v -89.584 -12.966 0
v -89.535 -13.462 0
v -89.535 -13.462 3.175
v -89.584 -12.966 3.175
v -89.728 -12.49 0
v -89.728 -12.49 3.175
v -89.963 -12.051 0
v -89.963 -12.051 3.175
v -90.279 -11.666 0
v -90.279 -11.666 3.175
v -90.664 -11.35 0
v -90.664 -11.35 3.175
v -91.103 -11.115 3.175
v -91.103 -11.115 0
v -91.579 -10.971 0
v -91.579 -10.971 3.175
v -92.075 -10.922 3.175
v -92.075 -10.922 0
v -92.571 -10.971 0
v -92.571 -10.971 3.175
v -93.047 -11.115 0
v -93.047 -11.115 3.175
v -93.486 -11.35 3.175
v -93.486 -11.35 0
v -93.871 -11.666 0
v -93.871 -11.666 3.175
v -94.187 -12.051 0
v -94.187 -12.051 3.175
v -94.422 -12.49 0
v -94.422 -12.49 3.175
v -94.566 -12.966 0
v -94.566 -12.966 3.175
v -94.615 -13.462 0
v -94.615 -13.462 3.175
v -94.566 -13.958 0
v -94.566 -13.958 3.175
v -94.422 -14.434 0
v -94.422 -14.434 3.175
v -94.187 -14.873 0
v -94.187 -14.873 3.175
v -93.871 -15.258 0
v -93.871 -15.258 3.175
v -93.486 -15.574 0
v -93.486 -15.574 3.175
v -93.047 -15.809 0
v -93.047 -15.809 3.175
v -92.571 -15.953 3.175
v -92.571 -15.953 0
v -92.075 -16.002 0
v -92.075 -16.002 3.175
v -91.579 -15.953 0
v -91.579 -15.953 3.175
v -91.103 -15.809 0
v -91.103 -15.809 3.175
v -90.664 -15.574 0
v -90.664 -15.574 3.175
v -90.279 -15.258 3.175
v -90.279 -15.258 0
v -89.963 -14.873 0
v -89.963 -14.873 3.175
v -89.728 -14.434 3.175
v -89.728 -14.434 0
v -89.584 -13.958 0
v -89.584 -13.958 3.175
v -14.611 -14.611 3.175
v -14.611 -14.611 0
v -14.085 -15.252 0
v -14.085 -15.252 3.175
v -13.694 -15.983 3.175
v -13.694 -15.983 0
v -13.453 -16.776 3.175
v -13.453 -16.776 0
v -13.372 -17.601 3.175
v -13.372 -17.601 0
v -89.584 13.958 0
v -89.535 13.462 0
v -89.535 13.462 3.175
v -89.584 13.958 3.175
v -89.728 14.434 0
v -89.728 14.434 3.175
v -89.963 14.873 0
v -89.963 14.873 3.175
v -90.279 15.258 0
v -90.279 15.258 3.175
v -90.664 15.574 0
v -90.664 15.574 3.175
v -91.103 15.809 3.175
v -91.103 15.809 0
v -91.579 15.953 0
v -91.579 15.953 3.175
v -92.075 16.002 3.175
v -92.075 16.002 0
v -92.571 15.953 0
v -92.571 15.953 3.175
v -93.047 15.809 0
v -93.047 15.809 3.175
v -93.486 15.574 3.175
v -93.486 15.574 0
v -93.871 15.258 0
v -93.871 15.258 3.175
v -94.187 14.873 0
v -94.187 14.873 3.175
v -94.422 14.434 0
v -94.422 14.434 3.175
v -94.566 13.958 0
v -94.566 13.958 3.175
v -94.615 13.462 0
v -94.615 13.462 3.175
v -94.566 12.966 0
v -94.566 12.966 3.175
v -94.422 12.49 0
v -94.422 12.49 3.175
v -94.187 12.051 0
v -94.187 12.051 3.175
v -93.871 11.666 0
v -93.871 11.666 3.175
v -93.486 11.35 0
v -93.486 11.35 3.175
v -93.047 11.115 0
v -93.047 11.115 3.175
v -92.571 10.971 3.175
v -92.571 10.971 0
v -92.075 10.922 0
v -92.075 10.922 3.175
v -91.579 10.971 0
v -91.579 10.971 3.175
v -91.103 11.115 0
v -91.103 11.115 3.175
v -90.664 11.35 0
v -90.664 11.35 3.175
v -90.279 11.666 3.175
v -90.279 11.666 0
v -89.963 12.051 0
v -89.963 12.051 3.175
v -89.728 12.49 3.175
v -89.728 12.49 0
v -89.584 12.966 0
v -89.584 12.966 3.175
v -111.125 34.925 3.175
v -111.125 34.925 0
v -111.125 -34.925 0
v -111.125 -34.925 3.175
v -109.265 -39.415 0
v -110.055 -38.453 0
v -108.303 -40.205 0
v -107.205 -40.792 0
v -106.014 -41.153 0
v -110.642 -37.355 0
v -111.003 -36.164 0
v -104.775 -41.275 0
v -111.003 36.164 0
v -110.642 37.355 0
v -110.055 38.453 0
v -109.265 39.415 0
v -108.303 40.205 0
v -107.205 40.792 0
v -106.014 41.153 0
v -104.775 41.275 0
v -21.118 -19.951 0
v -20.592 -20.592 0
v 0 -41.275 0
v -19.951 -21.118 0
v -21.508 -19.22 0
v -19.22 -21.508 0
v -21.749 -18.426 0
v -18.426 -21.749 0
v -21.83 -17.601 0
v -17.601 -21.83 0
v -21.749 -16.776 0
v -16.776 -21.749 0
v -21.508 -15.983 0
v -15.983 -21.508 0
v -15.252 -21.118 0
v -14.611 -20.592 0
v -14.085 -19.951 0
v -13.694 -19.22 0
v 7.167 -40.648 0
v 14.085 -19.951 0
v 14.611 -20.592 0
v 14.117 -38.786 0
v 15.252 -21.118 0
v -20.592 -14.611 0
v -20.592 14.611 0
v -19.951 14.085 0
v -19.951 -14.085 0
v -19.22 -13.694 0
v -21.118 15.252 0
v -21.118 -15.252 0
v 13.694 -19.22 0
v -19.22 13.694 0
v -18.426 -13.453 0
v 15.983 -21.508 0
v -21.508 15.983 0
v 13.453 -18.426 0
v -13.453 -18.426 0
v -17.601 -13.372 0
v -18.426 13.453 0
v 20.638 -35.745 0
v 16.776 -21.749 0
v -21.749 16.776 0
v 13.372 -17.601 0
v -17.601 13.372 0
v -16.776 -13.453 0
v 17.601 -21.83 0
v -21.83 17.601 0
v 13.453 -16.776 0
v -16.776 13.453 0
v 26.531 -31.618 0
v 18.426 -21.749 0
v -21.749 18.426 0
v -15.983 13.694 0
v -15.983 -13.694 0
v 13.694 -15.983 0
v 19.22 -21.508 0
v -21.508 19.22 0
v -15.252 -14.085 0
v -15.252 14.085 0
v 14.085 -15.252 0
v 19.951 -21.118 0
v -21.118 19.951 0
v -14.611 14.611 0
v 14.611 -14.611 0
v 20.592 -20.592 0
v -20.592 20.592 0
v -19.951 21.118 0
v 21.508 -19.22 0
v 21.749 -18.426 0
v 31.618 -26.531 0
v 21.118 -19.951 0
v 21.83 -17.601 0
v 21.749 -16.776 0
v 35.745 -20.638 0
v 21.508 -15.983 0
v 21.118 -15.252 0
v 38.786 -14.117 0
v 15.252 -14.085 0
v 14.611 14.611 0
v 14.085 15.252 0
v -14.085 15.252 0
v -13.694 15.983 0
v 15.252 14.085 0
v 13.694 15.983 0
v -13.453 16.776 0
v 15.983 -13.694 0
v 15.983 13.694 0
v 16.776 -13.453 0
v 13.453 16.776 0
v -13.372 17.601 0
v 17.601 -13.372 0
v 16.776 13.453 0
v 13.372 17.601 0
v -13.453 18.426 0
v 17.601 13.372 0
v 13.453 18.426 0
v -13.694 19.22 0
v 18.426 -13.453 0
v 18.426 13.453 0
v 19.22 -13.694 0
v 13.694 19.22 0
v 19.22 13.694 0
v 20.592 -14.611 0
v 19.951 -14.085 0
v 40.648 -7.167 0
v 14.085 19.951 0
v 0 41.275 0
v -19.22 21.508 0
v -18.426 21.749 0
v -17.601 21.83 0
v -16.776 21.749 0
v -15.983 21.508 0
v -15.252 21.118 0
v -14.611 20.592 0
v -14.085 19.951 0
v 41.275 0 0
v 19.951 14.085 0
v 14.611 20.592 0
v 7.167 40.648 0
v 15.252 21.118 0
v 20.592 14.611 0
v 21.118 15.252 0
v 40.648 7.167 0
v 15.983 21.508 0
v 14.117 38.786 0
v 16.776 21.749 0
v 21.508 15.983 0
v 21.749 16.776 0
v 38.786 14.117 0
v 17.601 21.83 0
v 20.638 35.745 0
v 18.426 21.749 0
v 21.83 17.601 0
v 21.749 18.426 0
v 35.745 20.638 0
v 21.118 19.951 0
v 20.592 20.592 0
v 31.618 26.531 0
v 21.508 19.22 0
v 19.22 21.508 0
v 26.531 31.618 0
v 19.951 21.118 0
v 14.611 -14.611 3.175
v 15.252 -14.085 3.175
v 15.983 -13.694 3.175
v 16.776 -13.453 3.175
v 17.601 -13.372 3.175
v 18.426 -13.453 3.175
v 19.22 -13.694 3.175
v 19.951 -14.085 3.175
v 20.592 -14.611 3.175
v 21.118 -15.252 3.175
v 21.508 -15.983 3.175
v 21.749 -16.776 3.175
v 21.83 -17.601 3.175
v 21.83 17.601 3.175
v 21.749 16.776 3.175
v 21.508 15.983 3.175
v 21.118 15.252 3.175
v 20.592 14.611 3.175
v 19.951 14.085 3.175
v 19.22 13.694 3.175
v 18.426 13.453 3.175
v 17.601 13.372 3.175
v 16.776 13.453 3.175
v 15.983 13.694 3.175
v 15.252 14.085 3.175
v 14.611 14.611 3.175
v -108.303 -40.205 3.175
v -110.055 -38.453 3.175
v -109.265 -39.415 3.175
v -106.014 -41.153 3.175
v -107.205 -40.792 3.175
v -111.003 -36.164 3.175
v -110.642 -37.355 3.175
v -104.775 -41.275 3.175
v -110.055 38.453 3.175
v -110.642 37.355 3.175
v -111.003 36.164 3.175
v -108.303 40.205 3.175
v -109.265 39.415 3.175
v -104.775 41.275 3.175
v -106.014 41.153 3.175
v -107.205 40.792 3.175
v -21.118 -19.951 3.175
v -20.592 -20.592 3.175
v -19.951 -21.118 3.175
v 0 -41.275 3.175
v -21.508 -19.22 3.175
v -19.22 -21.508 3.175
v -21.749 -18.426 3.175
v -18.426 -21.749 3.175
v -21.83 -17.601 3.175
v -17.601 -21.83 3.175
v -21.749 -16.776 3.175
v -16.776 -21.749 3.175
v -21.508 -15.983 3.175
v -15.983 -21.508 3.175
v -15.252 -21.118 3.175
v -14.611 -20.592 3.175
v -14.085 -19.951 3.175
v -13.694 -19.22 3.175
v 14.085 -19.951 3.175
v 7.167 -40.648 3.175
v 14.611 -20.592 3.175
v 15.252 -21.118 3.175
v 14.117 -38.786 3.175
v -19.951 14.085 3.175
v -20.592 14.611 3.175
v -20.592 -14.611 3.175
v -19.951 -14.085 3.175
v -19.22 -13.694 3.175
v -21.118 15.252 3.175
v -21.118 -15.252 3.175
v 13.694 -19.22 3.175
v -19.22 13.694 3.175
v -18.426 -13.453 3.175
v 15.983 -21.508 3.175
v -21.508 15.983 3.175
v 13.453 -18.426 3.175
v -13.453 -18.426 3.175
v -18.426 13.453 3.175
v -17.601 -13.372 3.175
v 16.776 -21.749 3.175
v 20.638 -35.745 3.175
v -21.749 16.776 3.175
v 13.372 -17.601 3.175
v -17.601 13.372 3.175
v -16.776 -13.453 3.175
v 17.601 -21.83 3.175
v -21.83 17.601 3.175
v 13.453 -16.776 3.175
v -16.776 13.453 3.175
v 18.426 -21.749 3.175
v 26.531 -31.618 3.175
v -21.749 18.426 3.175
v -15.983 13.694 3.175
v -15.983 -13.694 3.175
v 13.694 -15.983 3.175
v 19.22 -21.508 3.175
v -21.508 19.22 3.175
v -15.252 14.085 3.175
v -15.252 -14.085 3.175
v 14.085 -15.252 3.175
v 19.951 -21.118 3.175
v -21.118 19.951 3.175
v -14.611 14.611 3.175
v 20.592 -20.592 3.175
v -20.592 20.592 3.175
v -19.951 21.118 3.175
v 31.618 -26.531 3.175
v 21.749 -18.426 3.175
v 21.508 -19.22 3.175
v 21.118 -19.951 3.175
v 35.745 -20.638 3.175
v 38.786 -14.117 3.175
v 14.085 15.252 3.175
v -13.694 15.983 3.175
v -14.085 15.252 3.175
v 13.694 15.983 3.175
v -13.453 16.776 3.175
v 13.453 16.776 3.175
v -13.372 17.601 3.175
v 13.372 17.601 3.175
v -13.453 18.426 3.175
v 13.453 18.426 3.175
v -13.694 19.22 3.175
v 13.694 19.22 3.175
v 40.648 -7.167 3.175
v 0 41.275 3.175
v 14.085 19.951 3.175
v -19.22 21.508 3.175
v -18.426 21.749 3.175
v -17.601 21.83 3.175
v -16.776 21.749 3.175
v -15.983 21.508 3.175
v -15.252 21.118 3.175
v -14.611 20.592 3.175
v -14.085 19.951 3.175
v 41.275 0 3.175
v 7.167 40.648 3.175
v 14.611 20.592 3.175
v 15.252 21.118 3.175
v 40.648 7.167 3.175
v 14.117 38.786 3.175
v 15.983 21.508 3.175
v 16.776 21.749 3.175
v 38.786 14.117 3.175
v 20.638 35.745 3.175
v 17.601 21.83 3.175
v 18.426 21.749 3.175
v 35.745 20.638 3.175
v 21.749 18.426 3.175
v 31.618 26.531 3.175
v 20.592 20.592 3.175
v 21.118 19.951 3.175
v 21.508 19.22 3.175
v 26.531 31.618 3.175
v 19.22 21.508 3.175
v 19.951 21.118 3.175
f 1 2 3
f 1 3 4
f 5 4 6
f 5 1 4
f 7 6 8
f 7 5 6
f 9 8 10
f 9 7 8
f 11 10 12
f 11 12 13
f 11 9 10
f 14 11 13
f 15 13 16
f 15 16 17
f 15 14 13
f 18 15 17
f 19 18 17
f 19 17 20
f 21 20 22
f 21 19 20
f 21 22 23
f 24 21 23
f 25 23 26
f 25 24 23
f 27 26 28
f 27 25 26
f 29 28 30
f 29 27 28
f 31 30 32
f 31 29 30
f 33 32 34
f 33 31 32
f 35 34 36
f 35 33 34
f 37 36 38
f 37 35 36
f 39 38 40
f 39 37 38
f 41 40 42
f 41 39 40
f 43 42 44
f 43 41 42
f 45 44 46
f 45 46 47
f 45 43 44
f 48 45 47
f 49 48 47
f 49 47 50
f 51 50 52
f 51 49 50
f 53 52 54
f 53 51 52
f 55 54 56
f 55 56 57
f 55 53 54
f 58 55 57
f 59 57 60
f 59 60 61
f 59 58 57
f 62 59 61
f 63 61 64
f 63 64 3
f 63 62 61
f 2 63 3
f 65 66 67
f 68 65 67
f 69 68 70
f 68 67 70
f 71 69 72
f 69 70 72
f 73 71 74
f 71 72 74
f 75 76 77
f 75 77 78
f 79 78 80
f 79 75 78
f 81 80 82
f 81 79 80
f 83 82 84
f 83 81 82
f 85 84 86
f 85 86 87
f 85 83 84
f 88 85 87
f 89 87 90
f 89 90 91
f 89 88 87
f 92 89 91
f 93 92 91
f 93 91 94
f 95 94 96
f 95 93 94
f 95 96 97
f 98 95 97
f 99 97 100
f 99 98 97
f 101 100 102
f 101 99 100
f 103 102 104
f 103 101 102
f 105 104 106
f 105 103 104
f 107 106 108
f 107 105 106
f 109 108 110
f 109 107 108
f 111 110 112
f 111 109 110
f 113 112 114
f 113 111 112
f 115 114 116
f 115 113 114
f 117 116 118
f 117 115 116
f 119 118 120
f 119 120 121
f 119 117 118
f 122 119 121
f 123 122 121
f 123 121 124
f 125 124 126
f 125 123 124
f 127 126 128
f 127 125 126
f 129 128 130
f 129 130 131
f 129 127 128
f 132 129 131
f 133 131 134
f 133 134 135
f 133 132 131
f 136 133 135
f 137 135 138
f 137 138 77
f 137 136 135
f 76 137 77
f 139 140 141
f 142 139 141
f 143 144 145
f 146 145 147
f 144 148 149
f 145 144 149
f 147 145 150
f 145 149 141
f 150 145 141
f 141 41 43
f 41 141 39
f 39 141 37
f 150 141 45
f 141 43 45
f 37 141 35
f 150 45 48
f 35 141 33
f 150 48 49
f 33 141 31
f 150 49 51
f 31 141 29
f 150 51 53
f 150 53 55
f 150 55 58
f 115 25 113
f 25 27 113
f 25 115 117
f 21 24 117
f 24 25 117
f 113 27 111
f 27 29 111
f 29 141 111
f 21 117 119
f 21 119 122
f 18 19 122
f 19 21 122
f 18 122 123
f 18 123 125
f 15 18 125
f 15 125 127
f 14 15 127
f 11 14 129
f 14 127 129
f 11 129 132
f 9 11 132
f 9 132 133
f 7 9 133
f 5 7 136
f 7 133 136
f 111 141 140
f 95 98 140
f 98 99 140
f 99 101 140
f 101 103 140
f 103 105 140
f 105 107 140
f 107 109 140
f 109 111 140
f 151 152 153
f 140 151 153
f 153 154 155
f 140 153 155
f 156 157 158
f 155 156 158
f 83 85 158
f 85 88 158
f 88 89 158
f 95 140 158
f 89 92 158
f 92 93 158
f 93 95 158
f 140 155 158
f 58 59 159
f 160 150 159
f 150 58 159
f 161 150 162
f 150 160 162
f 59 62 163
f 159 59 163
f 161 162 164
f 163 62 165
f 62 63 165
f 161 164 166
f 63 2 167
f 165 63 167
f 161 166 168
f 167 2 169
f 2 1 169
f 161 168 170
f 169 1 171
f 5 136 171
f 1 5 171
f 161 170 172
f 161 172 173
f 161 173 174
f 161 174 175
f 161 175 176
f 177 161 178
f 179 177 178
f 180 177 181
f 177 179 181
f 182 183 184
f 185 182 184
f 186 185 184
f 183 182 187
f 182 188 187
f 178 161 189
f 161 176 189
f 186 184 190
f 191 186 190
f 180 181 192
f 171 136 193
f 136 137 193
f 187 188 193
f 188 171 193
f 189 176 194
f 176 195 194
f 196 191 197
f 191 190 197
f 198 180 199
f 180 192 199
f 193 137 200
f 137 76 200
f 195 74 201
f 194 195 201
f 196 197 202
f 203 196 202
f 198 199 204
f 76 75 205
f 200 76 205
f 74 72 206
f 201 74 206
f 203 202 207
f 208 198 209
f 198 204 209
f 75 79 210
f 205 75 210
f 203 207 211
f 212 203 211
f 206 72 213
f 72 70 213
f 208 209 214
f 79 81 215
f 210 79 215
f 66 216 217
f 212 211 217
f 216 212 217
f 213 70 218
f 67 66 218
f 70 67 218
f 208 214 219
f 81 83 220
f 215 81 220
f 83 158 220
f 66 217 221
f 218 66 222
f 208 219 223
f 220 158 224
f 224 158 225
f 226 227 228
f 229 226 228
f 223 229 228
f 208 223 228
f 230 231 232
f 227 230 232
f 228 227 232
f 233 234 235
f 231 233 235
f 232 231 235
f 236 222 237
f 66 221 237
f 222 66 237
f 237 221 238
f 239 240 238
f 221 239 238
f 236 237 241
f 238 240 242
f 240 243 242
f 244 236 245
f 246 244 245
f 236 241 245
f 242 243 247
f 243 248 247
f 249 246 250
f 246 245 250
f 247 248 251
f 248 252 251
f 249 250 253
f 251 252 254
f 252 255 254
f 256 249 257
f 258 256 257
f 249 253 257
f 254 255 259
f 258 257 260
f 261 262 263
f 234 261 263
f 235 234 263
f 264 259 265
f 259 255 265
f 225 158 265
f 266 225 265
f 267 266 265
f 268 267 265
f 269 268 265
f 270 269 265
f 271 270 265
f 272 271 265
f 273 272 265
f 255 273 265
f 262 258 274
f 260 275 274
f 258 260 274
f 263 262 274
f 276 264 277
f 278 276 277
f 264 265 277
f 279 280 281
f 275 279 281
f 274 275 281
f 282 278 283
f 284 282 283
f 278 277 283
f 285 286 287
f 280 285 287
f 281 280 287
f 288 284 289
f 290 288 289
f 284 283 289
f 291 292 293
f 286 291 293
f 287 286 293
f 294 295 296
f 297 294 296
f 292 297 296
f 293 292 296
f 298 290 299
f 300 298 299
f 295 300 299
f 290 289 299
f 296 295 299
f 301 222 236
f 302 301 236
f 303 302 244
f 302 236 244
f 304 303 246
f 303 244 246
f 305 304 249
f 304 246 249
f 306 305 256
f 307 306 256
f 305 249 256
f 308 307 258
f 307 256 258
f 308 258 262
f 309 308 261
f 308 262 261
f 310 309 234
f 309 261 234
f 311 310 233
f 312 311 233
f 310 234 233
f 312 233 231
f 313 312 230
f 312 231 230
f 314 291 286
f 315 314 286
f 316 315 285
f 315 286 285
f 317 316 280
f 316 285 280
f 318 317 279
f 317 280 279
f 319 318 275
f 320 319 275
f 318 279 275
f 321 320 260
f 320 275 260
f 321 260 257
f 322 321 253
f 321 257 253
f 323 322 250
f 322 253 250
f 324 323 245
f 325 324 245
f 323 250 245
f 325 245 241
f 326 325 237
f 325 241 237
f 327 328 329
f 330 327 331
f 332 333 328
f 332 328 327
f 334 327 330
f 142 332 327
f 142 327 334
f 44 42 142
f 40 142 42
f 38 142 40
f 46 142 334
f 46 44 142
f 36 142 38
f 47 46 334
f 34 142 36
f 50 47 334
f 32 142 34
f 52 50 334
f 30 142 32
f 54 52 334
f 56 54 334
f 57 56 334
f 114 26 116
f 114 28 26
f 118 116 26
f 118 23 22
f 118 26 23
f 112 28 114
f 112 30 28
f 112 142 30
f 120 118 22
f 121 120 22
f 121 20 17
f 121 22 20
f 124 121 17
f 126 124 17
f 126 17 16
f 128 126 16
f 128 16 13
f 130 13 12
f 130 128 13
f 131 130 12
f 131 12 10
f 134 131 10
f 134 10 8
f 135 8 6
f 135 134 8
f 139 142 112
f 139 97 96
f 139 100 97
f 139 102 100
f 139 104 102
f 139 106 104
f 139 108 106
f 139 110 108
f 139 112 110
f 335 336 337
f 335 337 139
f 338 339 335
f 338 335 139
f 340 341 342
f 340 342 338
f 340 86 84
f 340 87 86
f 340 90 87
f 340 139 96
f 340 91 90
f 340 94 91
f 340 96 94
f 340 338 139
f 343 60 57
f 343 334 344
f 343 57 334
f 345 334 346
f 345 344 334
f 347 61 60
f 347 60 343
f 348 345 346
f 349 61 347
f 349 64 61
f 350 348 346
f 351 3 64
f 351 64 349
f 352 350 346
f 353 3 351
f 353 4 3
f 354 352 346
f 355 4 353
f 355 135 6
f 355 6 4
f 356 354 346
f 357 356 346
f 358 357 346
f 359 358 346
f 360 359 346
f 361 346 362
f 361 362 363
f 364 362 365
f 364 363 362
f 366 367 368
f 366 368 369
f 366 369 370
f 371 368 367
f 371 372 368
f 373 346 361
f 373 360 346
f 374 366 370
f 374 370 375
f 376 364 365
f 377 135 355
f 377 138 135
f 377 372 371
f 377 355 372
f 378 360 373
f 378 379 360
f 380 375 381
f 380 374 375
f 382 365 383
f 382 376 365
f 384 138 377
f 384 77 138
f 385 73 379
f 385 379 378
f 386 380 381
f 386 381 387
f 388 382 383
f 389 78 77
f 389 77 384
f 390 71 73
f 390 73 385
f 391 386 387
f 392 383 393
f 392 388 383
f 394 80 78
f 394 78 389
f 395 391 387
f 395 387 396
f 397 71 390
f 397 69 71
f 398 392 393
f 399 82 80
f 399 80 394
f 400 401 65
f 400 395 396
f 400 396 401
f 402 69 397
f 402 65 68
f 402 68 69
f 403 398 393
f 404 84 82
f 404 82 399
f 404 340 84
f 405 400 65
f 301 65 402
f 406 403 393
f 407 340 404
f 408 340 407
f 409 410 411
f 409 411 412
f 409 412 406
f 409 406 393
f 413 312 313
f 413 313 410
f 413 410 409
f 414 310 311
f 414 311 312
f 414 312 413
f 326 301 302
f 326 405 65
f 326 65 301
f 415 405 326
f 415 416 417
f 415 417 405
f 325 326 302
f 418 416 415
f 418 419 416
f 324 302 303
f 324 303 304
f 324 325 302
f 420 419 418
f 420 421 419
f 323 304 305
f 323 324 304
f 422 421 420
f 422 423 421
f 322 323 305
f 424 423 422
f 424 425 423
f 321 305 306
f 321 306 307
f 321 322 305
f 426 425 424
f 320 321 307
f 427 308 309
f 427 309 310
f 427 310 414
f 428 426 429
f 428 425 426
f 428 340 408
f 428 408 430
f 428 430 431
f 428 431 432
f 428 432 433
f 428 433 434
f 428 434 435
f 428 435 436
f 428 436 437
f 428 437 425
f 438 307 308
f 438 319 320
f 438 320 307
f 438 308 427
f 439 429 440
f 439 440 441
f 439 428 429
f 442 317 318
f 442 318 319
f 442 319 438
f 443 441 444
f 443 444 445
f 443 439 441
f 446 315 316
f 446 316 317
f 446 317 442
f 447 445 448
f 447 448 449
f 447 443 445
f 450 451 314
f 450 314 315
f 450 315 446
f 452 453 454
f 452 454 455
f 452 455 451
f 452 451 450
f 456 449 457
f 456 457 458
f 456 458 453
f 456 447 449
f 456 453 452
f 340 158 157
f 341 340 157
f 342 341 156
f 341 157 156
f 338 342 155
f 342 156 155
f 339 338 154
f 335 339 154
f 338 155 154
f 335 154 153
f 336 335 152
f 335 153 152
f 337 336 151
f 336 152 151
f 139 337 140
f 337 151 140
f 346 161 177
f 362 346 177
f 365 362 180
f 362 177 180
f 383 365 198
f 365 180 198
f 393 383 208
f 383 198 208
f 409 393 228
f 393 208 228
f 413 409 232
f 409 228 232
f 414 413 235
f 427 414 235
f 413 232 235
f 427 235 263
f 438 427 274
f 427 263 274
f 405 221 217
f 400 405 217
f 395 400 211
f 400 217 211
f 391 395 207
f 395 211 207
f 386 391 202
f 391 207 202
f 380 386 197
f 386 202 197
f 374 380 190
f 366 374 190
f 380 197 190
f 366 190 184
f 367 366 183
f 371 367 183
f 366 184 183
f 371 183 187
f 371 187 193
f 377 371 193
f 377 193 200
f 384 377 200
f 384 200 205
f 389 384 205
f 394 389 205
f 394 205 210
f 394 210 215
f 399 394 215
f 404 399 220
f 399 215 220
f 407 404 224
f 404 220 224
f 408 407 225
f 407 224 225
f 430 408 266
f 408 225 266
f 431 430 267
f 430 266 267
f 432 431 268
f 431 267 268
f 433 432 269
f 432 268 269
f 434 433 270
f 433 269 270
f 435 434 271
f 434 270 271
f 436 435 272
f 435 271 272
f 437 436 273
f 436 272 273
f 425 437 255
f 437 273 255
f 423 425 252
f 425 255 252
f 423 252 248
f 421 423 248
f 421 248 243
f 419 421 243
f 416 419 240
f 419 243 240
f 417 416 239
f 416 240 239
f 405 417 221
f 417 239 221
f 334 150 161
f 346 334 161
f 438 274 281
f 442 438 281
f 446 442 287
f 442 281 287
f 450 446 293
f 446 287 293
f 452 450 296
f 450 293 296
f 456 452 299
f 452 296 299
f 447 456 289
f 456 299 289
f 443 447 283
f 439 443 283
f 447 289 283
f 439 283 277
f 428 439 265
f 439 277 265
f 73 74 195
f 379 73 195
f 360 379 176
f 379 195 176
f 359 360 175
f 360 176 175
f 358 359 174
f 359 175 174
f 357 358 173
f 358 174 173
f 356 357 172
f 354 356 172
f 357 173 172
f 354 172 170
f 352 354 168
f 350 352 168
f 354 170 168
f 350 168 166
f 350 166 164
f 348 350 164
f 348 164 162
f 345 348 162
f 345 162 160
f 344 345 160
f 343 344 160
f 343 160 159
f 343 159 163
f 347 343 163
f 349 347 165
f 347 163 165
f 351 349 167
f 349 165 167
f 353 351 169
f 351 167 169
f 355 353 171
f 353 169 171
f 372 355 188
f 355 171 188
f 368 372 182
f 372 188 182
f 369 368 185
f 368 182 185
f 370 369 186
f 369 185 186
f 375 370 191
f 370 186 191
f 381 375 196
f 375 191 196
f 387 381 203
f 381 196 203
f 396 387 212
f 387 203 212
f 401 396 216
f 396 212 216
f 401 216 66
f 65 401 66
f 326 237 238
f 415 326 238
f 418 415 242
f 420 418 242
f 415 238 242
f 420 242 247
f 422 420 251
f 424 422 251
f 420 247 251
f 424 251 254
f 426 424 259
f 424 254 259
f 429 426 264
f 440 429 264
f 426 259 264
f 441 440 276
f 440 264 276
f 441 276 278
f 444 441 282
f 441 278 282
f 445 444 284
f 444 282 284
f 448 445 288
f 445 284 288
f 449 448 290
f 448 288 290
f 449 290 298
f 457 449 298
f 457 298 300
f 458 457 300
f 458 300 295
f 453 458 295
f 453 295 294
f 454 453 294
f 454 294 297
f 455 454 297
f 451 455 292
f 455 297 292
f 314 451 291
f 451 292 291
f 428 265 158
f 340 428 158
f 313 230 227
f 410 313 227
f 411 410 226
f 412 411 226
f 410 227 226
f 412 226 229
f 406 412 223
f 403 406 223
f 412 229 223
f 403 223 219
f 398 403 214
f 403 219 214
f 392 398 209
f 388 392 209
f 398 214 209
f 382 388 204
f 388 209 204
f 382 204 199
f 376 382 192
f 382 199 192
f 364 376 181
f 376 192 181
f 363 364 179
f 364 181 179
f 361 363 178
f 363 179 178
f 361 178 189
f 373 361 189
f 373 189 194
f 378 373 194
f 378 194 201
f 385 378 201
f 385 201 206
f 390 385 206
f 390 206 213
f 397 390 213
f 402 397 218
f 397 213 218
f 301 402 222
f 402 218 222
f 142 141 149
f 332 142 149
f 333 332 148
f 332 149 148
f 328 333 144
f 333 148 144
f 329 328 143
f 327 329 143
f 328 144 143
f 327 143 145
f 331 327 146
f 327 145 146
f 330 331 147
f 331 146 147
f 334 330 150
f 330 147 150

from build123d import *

# Parameters (mm, degrees)
F0_R     = 2.54
F1_DEPTH = 3.175


# Not quite as in the source:
# - a feature names something its author has since deleted; it is built from what else it names


with BuildPart() as f1:
    # F0 (on Top) → F1 (new body)
    with BuildSketch(Plane.XY):
        with BuildLine():
            ThreePointArc((-41.275, 0), (-29.1858323935, 29.1858323935), (0, 41.275))
            Line((0, 41.275), (-104.775, 41.275))
            ThreePointArc((-104.775, 41.275), (-109.2651280605, 39.4151280605), (-111.125, 34.925))
            Line((-111.125, 34.925), (-111.125, 0))
            Line((-111.125, 0), (-41.275, 0))
        make_face()
        with Locations((-92.075, 13.462)):
            Circle(F0_R, mode=Mode.SUBTRACT)
        with BuildLine():
            Line((-104.775, -41.275), (0, -41.275))
            ThreePointArc((0, -41.275), (-29.1858323935, -29.1858323935), (-41.275, 0))
            Line((-41.275, 0), (-111.125, 0))
            Line((-111.125, 0), (-111.125, -34.925))
            ThreePointArc((-111.125, -34.925), (-109.2651280605, -39.4151280605), (-104.775, -41.275))
        make_face()
        with Locations((-92.075, -13.462)):
            Circle(F0_R, mode=Mode.SUBTRACT)
        with BuildLine():
            Line((0, 2.8299858928), (0, 41.275))
            ThreePointArc((0, 41.275), (-29.1858323935, 29.1858323935), (-41.275, 0))
            Line((-41.275, 0), (0, 0))
            Line((0, 0), (0, 2.8299858928))
        make_face()
        with BuildLine():
            ThreePointArc((-13.3722019973, 17.6013019973), (-13.6941230664, 15.9828954935), (-14.610876709, 14.610876709))
            ThreePointArc((-14.610876709, 14.610876709), (-21.5084809282, 19.2197085011), (-13.3722019973, 17.6013019973))
        make_face(mode=Mode.SUBTRACT)
        with BuildLine():
            ThreePointArc((-41.275, 0), (-29.1858323935, -29.1858323935), (0, -41.275))
            Line((0, -41.275), (0, 0))
            Line((0, 0), (-41.275, 0))
        make_face()
        with BuildLine():
            ThreePointArc((-13.3722019973, -17.6013019973), (-21.5084809282, -19.2197085011), (-14.610876709, -14.610876709))
            ThreePointArc((-14.610876709, -14.610876709), (-13.6941230664, -15.9828954935), (-13.3722019973, -17.6013019973))
        make_face(mode=Mode.SUBTRACT)
        with BuildLine():
            ThreePointArc((0, -41.275), (29.1858323935, -29.1858323935), (41.275, 0))
            ThreePointArc((41.275, 0), (29.1858323935, 29.1858323935), (0, 41.275))
            Line((0, 41.275), (0, 2.8299858928))
            Line((0, 2.8299858928), (0, 0))
            Line((0, 0), (0, -41.275))
        make_face()
        with BuildLine():
            ThreePointArc((21.8304019973, -17.6013019973), (15.9828954935, -21.5084809282), (14.610876709, -14.610876709))
            ThreePointArc((14.610876709, -14.610876709), (19.2197085011, -13.6941230664), (21.8304019973, -17.6013019973))
        make_face(mode=Mode.SUBTRACT)
        with BuildLine():
            ThreePointArc((21.8304019973, 17.6013019973), (19.2197085011, 13.6941230664), (14.610876709, 14.610876709))
            ThreePointArc((14.610876709, 14.610876709), (15.9828954935, 21.5084809282), (21.8304019973, 17.6013019973))
        make_face(mode=Mode.SUBTRACT)
    extrude(amount=F1_DEPTH)


solid = f1.part
